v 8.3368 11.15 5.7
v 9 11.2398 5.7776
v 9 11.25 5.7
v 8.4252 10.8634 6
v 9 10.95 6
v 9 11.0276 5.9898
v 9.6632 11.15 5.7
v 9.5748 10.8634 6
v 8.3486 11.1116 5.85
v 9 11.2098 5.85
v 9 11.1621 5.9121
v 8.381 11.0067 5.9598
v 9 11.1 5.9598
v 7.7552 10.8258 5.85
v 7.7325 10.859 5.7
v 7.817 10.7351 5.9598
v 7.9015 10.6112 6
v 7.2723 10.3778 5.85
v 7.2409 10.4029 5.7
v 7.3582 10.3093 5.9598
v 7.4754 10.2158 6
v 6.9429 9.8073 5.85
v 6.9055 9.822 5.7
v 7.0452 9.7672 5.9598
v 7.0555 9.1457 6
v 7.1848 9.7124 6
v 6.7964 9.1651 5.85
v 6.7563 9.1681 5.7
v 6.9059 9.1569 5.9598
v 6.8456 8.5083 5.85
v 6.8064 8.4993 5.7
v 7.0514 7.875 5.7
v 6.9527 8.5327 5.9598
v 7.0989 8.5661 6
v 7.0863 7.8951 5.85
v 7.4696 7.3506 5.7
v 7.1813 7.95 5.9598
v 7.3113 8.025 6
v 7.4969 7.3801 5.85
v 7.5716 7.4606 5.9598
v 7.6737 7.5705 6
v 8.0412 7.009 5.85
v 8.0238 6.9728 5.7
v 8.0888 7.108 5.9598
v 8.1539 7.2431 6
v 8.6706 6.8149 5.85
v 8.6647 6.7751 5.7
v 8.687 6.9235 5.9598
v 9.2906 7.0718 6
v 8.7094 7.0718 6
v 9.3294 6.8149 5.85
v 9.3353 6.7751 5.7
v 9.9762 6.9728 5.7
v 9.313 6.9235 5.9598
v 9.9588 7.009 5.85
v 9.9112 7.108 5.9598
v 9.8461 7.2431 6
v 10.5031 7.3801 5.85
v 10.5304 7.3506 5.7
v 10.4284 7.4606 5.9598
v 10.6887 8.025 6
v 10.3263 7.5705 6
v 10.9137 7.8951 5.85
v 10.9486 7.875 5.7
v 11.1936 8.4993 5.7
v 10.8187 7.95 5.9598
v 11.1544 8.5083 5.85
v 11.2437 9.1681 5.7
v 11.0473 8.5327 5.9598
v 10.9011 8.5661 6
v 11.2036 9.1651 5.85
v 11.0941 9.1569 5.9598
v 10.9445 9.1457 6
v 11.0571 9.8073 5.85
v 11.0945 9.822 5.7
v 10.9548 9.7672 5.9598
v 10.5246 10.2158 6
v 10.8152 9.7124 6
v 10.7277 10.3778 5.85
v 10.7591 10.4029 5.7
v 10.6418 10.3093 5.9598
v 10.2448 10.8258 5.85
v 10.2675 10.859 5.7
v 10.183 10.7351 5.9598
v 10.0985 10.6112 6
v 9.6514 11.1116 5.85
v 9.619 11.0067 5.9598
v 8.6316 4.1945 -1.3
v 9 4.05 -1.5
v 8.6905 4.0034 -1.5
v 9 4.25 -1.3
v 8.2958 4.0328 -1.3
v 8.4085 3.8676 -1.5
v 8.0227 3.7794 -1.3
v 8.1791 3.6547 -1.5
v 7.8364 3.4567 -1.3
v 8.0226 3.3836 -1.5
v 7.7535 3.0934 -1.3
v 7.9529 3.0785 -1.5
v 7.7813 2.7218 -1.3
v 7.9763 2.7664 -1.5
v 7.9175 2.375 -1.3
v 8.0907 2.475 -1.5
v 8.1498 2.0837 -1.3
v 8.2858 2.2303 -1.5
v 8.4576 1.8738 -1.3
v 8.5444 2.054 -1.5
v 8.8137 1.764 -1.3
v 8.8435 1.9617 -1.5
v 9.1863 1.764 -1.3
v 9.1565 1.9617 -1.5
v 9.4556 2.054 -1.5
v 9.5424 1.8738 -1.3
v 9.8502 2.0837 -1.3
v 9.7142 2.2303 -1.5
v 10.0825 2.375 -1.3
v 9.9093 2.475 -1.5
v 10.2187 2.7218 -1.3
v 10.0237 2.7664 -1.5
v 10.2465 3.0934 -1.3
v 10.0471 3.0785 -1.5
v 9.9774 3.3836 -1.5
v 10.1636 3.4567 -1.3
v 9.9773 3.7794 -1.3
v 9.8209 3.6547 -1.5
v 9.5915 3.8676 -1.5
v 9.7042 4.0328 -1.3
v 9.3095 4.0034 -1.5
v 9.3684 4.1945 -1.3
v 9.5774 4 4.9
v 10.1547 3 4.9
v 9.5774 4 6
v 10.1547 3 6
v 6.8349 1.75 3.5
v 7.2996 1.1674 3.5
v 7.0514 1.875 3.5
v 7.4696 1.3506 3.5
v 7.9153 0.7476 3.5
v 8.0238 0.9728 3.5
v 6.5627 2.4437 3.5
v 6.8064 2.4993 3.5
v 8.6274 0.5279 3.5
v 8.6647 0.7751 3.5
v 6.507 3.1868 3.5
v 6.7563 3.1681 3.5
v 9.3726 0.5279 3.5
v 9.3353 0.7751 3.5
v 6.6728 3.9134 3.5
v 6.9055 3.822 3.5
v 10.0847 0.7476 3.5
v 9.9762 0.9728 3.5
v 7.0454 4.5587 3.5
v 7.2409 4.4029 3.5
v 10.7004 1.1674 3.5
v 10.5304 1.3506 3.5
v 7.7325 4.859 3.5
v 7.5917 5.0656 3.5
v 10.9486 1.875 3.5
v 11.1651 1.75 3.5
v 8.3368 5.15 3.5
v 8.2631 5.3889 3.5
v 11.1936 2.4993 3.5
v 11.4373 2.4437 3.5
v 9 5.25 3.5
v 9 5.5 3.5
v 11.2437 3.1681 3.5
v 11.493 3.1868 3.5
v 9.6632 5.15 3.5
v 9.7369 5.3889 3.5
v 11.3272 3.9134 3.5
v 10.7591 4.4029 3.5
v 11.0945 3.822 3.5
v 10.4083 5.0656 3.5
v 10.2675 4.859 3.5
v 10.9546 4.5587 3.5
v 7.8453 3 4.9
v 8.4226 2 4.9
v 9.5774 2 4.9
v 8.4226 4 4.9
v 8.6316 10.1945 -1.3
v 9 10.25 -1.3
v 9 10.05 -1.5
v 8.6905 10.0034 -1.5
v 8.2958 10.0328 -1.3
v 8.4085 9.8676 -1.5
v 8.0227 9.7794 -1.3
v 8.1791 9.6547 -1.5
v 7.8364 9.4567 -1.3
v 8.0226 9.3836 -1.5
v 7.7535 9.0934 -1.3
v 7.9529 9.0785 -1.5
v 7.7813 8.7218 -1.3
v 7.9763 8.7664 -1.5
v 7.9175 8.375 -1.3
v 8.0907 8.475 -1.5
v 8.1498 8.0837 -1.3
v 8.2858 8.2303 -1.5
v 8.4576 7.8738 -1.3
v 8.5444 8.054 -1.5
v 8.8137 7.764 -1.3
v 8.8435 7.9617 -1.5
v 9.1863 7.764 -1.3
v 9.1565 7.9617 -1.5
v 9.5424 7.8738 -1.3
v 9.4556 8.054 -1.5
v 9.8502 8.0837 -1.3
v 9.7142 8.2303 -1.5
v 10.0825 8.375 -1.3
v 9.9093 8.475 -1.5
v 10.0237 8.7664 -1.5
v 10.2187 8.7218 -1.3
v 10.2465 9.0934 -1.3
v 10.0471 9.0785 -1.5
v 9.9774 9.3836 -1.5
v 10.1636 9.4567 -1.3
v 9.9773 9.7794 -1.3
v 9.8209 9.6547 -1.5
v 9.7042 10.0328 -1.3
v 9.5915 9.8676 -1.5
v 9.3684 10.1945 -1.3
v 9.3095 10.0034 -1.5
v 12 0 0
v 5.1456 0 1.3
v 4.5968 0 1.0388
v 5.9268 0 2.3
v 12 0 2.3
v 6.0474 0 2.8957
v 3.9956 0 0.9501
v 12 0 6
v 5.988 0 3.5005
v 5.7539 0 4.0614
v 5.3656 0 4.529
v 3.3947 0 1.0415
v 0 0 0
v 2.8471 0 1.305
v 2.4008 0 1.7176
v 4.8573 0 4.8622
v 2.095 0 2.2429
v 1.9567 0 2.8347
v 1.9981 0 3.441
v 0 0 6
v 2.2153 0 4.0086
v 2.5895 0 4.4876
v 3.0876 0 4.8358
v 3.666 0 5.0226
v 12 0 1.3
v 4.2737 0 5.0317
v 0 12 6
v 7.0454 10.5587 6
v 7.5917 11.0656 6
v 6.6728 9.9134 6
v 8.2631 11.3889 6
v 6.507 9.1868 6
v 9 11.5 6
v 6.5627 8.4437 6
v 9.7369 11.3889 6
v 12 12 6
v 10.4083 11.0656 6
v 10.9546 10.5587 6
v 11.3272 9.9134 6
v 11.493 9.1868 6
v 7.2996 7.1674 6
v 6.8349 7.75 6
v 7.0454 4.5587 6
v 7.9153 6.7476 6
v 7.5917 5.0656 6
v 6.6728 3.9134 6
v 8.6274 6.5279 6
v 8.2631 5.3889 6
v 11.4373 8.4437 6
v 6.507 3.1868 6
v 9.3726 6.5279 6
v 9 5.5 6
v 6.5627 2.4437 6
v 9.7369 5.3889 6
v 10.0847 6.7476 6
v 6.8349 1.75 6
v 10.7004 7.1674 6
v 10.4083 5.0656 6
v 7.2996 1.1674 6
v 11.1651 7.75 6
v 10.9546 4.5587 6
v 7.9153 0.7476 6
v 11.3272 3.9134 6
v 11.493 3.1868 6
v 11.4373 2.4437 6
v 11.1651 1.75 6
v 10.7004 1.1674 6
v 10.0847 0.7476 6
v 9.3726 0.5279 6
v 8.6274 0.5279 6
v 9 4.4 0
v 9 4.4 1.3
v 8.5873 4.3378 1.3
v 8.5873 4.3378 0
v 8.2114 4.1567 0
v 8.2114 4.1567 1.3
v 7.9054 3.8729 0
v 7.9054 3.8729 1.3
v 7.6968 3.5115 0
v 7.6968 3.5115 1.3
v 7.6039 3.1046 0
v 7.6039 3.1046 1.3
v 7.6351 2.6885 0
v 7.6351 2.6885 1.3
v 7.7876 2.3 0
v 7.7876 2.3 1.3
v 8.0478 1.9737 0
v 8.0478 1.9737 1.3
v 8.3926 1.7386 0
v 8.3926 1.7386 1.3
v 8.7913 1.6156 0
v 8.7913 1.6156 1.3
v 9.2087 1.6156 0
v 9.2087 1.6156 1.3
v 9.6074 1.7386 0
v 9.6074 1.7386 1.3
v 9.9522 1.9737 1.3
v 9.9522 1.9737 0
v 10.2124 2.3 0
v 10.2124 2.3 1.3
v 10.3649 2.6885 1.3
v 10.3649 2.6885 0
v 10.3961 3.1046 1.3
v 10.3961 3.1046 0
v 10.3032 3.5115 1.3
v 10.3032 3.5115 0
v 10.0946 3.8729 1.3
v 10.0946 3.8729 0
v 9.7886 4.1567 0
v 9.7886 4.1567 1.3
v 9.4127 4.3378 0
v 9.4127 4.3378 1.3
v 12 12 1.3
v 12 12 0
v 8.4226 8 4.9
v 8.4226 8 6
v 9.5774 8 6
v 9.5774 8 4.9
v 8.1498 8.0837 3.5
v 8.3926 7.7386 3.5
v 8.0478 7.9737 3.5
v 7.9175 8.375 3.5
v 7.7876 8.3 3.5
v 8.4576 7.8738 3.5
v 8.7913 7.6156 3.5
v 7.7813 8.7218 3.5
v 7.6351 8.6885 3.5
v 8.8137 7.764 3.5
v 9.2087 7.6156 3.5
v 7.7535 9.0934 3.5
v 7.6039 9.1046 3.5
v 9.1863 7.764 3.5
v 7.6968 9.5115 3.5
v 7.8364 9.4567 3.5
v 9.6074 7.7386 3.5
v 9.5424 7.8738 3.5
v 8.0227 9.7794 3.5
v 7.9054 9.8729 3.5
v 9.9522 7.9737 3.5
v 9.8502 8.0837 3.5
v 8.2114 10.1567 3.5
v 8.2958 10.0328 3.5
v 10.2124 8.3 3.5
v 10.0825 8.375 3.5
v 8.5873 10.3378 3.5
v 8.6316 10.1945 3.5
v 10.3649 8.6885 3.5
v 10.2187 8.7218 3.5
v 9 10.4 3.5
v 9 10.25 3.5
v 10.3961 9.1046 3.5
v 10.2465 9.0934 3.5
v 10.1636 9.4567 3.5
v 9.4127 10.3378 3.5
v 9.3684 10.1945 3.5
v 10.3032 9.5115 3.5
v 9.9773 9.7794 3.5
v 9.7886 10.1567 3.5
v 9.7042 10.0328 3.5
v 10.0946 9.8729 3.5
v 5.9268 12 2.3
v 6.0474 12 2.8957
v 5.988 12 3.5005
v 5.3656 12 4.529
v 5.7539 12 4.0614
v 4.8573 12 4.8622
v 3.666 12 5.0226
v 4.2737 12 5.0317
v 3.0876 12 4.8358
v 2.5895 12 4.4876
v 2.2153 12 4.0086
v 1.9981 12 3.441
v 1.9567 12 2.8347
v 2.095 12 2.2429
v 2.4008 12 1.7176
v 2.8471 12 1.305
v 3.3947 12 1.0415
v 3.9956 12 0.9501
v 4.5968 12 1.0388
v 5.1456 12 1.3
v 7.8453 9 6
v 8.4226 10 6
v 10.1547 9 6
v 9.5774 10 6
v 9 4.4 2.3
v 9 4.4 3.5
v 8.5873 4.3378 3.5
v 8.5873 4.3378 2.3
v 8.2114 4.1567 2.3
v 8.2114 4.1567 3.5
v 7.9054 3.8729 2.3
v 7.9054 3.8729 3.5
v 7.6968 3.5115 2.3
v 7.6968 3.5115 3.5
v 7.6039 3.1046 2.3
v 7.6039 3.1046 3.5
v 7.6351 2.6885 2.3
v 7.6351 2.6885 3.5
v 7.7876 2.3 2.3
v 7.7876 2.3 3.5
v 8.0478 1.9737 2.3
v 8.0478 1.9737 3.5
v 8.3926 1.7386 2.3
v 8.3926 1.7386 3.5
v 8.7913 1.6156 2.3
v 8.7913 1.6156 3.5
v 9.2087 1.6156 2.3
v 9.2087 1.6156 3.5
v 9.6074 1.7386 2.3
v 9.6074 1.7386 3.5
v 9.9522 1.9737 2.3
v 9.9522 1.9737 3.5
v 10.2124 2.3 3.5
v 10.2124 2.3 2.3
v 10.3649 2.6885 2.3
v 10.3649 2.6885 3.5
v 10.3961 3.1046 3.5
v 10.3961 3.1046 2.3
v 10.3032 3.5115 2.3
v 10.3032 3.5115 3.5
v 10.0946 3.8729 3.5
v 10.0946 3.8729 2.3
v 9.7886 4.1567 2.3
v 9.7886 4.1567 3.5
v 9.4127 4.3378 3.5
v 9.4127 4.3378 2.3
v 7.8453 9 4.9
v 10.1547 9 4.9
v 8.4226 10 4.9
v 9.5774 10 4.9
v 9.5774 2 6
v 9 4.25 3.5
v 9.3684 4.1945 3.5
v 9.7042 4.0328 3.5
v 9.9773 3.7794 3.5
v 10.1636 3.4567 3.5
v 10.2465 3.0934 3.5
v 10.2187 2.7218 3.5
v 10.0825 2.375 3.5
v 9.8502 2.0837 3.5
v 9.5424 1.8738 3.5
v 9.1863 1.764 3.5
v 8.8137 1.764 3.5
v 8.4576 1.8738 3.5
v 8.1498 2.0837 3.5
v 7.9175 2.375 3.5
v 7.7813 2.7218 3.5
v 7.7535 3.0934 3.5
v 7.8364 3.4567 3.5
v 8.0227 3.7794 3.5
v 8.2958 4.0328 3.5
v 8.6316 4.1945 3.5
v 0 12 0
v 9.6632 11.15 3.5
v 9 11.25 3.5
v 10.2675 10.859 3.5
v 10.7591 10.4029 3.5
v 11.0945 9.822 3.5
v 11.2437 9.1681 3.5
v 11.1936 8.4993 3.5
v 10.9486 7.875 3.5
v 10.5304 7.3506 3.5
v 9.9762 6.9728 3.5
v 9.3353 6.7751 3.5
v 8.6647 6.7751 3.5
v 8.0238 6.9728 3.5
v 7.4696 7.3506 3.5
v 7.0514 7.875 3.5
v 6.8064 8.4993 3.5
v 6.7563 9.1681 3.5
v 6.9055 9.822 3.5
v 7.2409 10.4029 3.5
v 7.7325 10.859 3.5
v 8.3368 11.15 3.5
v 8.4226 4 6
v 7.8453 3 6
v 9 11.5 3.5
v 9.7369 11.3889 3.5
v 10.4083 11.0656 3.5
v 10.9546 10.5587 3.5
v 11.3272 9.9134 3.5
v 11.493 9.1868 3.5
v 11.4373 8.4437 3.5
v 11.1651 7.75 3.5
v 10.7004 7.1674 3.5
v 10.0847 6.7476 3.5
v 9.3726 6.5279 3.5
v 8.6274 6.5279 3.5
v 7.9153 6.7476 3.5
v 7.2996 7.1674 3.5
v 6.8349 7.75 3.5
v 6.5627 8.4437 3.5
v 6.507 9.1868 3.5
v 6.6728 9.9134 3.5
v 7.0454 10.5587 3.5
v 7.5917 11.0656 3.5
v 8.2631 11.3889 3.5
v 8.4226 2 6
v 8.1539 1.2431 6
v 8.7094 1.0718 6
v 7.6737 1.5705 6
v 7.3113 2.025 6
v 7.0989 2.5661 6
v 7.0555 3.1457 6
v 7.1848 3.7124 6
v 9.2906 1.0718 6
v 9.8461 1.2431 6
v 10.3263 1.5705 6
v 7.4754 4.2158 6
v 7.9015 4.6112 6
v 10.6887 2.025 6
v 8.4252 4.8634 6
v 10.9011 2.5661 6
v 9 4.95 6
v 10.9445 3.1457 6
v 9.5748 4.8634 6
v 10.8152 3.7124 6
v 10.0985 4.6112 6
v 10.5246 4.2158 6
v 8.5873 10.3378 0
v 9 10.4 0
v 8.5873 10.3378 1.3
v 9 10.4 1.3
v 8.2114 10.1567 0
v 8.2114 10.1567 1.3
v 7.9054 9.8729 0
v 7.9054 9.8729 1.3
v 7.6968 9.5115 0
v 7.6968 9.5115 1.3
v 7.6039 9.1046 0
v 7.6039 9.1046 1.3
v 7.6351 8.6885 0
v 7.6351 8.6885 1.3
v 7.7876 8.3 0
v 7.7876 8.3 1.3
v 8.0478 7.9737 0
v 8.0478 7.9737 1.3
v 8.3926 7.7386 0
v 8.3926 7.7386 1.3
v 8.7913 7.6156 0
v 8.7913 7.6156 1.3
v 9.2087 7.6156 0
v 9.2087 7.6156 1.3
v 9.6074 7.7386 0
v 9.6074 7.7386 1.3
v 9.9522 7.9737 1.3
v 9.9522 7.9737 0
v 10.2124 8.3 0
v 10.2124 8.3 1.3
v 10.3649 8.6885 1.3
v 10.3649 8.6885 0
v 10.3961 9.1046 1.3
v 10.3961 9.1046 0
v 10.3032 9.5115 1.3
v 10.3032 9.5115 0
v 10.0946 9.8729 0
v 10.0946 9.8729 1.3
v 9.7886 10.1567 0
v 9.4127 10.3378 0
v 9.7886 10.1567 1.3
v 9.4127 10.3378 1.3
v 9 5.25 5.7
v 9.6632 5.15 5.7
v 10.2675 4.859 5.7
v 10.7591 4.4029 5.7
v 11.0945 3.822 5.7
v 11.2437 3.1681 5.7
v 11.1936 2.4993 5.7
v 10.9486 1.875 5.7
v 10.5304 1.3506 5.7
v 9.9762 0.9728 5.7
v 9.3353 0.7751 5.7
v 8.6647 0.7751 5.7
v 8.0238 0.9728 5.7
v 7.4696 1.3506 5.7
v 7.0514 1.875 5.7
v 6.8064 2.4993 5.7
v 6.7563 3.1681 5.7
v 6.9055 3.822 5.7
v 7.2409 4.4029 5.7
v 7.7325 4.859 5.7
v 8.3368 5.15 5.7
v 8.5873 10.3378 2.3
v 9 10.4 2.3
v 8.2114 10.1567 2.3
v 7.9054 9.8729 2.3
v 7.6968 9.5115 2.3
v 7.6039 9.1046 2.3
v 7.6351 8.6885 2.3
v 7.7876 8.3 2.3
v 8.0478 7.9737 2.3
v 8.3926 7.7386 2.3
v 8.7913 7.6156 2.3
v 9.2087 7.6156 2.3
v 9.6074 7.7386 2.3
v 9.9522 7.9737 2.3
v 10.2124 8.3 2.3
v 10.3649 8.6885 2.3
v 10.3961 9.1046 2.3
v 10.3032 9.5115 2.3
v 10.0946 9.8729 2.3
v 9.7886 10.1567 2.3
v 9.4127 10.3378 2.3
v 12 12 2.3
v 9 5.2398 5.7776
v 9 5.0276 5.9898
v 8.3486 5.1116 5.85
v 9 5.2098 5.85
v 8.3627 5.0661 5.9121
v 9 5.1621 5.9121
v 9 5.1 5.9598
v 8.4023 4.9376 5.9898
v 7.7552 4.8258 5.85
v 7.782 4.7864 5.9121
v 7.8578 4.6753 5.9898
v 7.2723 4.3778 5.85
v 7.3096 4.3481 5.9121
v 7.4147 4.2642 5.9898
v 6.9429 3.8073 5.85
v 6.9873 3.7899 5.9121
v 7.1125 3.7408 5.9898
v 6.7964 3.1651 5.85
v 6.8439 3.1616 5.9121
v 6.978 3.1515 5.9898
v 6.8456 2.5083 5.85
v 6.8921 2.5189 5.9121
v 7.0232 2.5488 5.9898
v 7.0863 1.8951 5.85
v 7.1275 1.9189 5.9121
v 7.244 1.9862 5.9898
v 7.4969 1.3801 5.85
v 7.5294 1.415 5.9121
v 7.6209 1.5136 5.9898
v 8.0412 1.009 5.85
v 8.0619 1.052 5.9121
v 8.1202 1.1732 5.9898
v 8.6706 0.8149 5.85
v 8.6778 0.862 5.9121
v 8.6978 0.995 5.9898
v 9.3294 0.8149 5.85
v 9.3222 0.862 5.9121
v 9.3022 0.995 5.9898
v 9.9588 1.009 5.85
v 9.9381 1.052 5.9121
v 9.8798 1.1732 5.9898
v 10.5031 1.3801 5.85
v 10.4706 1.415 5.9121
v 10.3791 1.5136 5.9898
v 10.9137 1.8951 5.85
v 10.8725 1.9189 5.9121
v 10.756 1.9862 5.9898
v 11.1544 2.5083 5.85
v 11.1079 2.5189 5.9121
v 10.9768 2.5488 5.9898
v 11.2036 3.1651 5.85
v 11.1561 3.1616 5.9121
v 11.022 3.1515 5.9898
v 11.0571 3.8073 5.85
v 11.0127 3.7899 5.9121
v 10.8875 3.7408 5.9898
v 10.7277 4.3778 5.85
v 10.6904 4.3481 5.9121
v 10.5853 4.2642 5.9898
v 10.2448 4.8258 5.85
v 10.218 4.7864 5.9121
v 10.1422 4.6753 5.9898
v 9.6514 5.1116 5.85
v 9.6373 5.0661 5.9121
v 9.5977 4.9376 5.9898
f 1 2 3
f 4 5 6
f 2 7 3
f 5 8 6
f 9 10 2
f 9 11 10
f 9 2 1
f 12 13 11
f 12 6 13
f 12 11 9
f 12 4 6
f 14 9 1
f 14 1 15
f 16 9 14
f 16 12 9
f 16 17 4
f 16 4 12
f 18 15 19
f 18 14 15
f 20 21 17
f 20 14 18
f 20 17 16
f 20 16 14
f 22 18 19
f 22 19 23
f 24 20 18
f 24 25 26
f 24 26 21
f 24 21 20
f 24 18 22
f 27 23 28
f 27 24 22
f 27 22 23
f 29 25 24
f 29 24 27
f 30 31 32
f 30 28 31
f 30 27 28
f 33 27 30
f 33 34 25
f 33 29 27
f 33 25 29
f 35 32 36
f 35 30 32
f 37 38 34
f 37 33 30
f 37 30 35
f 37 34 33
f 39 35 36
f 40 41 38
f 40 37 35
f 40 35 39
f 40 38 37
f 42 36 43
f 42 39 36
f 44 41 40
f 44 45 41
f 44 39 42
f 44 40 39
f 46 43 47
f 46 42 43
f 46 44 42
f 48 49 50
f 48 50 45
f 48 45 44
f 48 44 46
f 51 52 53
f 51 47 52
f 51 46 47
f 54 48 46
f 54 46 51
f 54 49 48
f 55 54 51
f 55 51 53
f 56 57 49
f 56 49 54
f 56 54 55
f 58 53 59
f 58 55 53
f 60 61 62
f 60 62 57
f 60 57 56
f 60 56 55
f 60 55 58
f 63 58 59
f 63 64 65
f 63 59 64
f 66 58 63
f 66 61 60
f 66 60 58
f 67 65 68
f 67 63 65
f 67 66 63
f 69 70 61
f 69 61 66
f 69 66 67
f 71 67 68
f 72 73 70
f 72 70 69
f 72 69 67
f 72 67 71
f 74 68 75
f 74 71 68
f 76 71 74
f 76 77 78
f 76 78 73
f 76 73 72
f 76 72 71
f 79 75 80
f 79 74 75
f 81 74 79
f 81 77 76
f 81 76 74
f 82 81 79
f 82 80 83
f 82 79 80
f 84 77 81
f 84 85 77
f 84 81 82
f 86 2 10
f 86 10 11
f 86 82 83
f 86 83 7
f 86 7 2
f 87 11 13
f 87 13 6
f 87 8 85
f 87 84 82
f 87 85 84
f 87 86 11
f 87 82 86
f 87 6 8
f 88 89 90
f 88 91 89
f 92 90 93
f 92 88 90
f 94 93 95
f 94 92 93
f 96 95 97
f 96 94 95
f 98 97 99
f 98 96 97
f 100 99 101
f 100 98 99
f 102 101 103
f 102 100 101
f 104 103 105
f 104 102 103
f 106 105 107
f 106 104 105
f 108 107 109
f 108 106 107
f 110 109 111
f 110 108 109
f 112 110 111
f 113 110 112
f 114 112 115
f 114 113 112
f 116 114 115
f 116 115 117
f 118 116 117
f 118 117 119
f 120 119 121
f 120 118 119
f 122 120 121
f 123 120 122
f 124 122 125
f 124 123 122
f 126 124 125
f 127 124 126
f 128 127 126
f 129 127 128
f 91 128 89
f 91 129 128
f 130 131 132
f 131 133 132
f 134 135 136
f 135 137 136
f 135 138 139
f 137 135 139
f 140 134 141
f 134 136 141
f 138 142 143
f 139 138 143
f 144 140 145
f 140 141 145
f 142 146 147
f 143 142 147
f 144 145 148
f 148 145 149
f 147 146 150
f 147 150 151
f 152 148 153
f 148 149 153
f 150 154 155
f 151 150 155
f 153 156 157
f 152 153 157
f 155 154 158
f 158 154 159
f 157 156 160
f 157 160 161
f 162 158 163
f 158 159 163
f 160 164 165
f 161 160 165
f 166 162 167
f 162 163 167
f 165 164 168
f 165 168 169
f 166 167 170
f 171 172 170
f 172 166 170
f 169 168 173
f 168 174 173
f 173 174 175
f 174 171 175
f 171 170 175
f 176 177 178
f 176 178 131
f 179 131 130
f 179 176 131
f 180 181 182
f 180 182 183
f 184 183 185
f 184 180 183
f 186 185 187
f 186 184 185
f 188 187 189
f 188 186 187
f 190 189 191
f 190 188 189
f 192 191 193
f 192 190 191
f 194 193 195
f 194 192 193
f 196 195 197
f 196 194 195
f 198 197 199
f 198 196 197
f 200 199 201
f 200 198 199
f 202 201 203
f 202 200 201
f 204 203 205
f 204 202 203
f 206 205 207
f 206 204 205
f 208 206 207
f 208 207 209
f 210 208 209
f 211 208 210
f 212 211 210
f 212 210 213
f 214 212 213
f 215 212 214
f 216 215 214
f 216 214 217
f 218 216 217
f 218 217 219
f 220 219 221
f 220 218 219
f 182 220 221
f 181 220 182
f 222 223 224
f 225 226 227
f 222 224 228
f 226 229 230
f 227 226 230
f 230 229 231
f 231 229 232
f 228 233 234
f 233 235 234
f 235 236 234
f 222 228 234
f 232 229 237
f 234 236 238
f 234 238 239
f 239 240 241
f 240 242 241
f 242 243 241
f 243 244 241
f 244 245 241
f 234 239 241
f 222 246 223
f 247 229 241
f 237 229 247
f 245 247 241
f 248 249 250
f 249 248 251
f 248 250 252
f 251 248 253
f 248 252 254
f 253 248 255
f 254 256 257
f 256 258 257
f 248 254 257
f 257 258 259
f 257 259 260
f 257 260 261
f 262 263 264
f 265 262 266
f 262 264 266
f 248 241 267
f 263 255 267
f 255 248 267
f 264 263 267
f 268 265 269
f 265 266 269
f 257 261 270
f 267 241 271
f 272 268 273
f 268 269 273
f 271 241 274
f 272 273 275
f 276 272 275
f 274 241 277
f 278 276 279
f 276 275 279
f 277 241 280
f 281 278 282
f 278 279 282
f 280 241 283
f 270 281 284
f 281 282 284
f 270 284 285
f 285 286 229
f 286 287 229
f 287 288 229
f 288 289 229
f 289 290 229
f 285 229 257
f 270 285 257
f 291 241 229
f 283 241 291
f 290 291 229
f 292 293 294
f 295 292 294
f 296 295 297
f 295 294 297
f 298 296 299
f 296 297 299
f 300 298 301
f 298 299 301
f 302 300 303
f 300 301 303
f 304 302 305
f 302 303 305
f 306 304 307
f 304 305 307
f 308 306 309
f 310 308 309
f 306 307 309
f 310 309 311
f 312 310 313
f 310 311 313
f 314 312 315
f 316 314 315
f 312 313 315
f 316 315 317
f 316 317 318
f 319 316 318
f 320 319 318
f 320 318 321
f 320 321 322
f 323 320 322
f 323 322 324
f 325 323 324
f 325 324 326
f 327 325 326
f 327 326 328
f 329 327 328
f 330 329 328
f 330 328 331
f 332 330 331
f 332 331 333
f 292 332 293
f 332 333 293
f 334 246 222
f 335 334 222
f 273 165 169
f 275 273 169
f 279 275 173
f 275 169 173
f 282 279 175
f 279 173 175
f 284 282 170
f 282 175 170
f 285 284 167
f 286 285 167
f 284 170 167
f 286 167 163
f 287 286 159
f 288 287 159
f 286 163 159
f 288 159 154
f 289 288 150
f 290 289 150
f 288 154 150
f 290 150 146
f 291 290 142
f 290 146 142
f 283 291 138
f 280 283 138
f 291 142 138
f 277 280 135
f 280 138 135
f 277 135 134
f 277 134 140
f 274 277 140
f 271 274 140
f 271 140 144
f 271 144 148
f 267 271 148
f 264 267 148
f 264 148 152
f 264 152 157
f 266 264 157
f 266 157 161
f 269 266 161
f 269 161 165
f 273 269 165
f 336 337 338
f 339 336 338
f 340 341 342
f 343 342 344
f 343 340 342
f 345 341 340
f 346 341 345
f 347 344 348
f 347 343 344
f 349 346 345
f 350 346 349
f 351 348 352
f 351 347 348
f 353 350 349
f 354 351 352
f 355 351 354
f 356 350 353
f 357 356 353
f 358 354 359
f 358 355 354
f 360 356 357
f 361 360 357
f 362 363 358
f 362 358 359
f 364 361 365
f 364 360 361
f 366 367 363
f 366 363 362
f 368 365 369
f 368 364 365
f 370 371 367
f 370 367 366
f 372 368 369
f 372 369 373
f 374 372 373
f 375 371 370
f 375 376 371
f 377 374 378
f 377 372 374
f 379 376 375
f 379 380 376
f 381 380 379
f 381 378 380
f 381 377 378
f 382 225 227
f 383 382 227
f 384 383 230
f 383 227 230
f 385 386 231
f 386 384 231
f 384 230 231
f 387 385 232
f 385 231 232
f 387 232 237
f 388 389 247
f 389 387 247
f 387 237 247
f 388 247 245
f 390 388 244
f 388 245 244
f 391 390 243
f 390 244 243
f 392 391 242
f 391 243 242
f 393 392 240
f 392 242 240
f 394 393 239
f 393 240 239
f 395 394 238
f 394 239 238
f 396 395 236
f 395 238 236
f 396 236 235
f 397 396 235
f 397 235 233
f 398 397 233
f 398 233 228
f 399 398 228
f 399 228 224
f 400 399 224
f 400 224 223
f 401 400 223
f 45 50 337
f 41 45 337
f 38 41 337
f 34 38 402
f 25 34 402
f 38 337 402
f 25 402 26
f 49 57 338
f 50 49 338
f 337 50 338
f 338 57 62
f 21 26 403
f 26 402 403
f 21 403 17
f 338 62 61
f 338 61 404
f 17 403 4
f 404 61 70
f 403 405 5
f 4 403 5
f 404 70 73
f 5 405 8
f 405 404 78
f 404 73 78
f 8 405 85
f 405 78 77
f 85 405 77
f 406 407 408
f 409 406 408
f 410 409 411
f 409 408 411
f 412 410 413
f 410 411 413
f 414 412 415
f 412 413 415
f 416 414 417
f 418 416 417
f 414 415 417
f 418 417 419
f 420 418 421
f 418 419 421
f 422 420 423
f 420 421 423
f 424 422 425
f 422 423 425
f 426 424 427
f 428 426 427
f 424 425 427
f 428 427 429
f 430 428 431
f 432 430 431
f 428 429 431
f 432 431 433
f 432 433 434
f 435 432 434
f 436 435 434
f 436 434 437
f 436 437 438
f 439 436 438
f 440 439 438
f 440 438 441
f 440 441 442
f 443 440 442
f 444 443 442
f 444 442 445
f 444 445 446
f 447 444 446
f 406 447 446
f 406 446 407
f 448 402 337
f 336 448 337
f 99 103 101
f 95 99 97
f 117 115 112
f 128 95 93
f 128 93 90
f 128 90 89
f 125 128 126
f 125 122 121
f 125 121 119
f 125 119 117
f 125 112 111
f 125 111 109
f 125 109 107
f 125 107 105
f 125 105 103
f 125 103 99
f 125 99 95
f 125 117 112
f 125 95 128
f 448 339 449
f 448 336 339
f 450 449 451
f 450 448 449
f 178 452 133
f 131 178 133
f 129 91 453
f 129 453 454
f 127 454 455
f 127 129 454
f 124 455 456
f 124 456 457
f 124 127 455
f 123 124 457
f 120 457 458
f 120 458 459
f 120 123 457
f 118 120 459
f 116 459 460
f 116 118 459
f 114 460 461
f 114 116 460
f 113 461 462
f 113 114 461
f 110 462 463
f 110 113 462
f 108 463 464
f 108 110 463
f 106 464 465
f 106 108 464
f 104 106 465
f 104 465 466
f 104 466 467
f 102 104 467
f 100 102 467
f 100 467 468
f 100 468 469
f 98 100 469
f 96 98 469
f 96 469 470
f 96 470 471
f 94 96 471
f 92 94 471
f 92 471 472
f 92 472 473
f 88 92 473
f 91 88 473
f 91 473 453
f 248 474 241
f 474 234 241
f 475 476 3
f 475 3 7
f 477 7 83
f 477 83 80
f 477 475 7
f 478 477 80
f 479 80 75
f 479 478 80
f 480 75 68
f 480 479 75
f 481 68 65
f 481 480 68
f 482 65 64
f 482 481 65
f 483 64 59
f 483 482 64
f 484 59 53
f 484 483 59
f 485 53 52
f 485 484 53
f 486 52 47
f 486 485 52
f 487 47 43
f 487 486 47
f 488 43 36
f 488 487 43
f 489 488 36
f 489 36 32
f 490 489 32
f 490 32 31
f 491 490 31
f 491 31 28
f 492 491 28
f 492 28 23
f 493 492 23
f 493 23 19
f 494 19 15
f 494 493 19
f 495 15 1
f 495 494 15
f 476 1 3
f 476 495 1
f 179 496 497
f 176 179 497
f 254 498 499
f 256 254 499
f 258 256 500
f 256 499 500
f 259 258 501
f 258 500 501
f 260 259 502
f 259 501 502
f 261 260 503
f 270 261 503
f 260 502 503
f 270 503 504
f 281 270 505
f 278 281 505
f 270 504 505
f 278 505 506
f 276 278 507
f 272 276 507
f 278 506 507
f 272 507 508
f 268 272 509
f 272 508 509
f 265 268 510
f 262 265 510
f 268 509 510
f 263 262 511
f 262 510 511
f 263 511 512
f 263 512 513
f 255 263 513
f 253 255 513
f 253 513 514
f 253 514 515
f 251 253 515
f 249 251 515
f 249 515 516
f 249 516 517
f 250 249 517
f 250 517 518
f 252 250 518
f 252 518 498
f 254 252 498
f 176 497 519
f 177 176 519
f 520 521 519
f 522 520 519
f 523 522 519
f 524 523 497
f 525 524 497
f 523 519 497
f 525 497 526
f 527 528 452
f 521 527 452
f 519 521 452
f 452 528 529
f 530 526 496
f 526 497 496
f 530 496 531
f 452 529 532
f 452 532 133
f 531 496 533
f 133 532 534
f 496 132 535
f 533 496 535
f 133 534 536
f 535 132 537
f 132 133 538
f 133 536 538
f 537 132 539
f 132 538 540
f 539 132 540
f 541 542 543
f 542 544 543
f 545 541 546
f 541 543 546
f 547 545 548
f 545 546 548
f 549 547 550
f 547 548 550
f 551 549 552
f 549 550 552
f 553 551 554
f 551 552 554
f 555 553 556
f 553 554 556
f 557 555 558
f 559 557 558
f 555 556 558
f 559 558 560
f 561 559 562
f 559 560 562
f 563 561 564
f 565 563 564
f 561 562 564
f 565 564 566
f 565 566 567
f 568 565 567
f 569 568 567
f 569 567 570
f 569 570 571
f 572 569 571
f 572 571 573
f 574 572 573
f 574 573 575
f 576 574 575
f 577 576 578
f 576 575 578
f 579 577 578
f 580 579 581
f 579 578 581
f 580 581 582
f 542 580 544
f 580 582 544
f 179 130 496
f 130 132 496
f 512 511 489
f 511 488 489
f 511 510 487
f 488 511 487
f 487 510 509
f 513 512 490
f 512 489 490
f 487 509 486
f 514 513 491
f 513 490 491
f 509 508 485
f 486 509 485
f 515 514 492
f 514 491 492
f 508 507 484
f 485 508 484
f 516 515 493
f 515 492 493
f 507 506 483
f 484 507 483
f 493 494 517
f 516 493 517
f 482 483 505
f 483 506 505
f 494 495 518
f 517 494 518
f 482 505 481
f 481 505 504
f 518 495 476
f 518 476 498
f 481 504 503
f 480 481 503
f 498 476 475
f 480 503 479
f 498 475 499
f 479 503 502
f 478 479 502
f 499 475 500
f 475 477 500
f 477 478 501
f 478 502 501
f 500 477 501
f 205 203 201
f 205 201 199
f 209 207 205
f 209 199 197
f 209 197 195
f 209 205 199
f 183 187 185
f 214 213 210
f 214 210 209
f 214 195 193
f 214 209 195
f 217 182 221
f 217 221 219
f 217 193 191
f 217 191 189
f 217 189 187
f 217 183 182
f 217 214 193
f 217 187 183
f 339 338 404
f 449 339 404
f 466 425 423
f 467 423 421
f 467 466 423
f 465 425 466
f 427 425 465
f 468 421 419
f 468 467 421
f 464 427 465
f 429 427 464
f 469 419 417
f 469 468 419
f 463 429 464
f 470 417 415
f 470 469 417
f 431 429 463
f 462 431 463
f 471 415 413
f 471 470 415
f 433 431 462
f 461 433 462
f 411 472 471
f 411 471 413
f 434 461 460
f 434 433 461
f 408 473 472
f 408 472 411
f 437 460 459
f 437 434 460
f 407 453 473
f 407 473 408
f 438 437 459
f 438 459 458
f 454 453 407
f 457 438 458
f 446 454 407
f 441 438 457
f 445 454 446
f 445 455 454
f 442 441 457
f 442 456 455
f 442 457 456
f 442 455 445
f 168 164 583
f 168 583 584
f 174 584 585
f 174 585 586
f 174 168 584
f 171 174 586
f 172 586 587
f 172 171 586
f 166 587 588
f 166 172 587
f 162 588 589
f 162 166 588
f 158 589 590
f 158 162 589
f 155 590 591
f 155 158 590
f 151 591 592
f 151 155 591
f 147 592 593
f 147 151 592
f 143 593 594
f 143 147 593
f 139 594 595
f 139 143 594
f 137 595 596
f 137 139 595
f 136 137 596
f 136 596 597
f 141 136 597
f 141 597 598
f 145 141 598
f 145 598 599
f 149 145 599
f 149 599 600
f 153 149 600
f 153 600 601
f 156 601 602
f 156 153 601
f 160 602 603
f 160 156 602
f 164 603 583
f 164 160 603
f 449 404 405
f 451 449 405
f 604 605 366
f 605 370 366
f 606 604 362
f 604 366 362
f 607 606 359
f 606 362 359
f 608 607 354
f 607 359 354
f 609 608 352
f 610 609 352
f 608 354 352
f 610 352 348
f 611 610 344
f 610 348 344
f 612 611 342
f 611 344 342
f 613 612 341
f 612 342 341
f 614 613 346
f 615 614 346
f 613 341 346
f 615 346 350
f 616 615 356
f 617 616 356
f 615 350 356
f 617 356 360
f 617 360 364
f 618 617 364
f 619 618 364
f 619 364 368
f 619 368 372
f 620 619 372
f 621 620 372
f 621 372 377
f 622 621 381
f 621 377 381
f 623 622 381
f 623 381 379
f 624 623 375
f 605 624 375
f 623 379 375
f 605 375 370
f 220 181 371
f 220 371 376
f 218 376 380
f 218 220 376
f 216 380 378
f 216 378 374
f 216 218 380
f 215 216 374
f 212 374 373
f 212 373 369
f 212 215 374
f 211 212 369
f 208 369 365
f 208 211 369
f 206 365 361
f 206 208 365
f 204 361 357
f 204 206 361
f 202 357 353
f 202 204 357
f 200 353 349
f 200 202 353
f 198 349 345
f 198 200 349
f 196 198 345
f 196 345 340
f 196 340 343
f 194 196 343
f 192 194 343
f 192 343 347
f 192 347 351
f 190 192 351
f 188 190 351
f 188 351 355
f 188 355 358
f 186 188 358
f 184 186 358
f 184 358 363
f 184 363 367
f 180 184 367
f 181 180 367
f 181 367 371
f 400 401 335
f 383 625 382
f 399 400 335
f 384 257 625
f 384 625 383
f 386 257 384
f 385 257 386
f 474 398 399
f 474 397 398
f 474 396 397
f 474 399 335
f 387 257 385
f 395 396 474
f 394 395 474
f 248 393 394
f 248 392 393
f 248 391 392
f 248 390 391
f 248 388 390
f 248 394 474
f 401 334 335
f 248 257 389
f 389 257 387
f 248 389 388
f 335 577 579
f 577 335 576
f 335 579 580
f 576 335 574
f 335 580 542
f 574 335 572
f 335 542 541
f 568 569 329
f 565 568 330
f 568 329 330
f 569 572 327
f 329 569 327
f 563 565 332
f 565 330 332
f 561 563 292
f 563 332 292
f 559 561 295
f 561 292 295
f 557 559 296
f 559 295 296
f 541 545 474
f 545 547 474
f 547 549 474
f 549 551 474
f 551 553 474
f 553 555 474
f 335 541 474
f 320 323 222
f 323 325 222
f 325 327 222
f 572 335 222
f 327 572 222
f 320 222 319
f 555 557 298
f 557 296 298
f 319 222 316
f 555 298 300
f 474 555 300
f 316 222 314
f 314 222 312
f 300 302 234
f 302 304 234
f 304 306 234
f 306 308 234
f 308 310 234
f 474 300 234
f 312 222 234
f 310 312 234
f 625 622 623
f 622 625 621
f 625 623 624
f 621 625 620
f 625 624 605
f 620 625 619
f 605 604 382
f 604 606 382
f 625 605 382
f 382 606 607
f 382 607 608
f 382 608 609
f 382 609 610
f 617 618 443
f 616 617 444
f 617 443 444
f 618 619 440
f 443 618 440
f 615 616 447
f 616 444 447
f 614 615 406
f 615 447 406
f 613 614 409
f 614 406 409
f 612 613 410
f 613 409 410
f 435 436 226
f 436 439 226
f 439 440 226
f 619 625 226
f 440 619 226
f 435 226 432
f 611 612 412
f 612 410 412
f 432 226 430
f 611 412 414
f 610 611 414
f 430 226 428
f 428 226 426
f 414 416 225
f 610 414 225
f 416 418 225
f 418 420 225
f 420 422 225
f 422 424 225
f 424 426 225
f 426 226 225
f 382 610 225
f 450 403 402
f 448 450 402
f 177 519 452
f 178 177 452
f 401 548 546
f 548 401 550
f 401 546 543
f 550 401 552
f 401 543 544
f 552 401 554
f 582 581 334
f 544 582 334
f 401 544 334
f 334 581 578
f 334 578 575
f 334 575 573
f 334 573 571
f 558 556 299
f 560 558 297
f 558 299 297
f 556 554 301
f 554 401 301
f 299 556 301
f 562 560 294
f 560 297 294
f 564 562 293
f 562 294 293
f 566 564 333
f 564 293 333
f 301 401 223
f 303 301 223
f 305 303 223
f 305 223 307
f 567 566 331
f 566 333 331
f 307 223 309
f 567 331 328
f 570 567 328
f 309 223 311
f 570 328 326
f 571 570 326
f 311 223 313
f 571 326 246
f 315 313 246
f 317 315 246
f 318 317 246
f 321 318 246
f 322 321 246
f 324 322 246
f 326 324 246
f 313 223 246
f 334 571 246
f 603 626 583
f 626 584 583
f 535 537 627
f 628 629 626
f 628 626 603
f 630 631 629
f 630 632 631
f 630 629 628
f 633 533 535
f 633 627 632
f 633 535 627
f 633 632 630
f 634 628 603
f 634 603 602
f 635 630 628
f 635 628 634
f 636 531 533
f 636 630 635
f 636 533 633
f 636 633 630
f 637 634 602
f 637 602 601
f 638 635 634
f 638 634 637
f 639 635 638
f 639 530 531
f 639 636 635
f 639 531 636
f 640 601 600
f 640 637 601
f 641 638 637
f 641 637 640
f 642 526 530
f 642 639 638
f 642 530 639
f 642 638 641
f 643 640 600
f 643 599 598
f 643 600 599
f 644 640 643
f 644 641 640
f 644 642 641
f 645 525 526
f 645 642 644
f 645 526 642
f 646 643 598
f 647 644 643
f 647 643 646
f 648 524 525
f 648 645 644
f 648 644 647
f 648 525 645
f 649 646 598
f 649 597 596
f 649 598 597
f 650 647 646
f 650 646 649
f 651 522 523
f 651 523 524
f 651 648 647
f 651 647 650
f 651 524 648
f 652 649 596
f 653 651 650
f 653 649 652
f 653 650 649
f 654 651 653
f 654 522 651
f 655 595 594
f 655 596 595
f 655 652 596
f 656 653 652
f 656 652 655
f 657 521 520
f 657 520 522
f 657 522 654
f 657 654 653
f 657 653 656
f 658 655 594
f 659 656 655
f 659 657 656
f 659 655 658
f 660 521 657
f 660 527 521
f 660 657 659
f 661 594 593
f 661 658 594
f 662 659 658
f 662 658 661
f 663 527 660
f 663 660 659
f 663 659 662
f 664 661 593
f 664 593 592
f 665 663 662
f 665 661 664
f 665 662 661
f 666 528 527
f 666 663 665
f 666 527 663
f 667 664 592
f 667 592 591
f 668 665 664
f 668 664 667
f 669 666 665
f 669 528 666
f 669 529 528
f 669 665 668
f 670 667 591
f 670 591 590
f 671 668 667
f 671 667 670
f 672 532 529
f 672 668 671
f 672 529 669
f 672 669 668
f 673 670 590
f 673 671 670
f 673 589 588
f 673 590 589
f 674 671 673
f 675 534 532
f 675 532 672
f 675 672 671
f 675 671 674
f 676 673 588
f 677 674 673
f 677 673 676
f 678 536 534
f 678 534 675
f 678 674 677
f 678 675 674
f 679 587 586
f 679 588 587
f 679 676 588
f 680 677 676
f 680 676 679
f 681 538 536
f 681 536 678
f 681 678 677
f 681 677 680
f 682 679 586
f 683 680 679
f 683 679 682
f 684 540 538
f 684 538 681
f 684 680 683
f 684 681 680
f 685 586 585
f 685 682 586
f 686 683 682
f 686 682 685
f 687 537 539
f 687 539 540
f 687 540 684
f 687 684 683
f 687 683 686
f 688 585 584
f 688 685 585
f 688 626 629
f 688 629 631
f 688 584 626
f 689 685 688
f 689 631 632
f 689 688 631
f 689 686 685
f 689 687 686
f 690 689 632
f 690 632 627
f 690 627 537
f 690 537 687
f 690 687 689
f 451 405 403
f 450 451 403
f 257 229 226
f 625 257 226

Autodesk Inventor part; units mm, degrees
sketch "Sketch_1" plane through (0, 0, 0) normal (0, 1, 0) x (-1, 0, 0)
  line L0 (0, 6) -> (-12, 6)
  line L1 (-12, 6) -> (-12, 2.3)
  line L2 (-12, 2.3) -> (-5.9268, 2.3)
  arc A0 (-5.1456, 1.3) -> (-5.9268, 2.3) centre (-4, 3) ccw
  line L3 (-5.1456, 1.3) -> (-12, 1.3)
  line L4 (-12, 1.3) -> (-12, 0)
  line L5 (-12, 0) -> (0, 0)
  line L6 (0, 0) -> (0, 6)
extrude "Extrusion1" add sketch "Sketch_1" along normal blind 12
sketch "Sketch2" plane through (12, 0, 0) normal (0, 0, -1) x (-1, 0, 0)
  point P0 (3, 3)
hole "Hole1" at (9, 3, 0) direction (0, 0, 1) diameter 2.8 depth 6
pattern_linear "Rectangular Pattern1" count 2 spacing 6 along (0, 1, 0) of "Hole1"
sketch "Sketch_4" plane through (9, 0, 0) normal (1, 0, 0) x (0, 0, -1)
  line L0 (-3.5, 3) -> (-6, 3)
  line L1 (-6, 3) -> (-6, 5.5)
  line L2 (-6, 5.5) -> (-3.5, 5.5)
  line L3 (-3.5, 5.5) -> (-3.5, 3)
  line L4 (-3.5, 3) -> (-6, 3)
revolve "Revolution1" cut sketch "Sketch_4" angle 360 about axis through (9, 3, 3.5) along (0, 0, -1)
pattern_linear "Rectangular Pattern2" count 2 spacing 6 along (0, 1, 0) of "Revolution1"
sketch "Sketch_12" plane through (9, 0, 0) normal (1, 0, 0) x (0, 0, -1)
  line L0 (1.5, 3) -> (-6, 3)
  line L1 (-6, 3) -> (-6, 4.95)
  arc A0 (-5.7, 5.25) -> (-6, 4.95) centre (-5.7, 4.95) ccw
  line L2 (-5.7, 5.25) -> (-3.5, 5.25)
  line L3 (-3.5, 5.25) -> (-3.5, 4.25)
  line L4 (-3.5, 4.25) -> (1.3, 4.25)
  line L5 (1.3, 4.25) -> (1.5, 4.05)
  line L6 (1.5, 4.05) -> (1.5, 3)
  line L7 (1.5, 3) -> (-6, 3)
revolve "Revolution2" add sketch "Sketch_12" angle 360 about axis through (9, 3, -1.5) along (0, 0, -1)
thread "Thread1" size "M2.5x0.45" class "6g" standard "ISO Metric profile" full length
pattern_linear "Rectangular Pattern3" count 2 spacing 6 along (0, 1, 0) of "Revolution2"
sketch "Sketch_14" plane through (9, 3, 6) normal (0, 0, 1) x (0, 1, 0)
  line L0 (-1, -0.5774) -> (0, -1.1547)
  line L1 (0, -1.1547) -> (1, -0.5774)
  line L2 (1, -0.5774) -> (1, 0.5774)
  line L3 (1, 0.5774) -> (0, 1.1547)
  line L4 (0, 1.1547) -> (-1, 0.5774)
  line L5 (-1, 0.5774) -> (-1, -0.5774)
extrude "Extrusion2" cut sketch "Sketch_14" against normal blind 1.1
pattern_linear "Rectangular Pattern4" count 2 spacing 6 along (0, 1, 0) of "Extrusion2"
ref_plane "as_nhs_01_XY" through (9, 3, 0) normal (0, 0, 1) x (1, 0, 0)
ref_plane "as_nhs_01_YZ" through (9, 3, 0) normal (1, 0, 0) x (0, 1, 0)
ref_plane "as_nhs_01_ZX" through (9, 3, 0) normal (0, 1, 0) x (0, 0, 1)
ref_plane "as_nhs_02_XY" through (9, 9, 0) normal (0, 0, 1) x (1, 0, 0)
ref_plane "as_nhs_02_YZ" through (9, 9, 0) normal (1, 0, 0) x (0, 1, 0)
ref_plane "as_nhs_02_ZX" through (9, 9, 0) normal (0, 1, 0) x (0, 0, 1)
ref_plane "s01_XY" through (9, 3, 3.5) normal (0, 0, 1) x (1, 0, 0)
ref_plane "s01_YZ" through (9, 3, 3.5) normal (1, 0, 0) x (0, 1, 0)
ref_plane "s01_ZX" through (9, 3, 3.5) normal (0, 1, 0) x (0, 0, 1)
ref_plane "s02_XY" through (9, 9, 3.5) normal (0, 0, 1) x (1, 0, 0)
ref_plane "s02_YZ" through (9, 9, 3.5) normal (1, 0, 0) x (0, 1, 0)
ref_plane "s02_ZX" through (9, 9, 3.5) normal (0, 1, 0) x (0, 0, 1)
properties part number "SCHUNK-9700901 Halter fuer NHS Du 4"
